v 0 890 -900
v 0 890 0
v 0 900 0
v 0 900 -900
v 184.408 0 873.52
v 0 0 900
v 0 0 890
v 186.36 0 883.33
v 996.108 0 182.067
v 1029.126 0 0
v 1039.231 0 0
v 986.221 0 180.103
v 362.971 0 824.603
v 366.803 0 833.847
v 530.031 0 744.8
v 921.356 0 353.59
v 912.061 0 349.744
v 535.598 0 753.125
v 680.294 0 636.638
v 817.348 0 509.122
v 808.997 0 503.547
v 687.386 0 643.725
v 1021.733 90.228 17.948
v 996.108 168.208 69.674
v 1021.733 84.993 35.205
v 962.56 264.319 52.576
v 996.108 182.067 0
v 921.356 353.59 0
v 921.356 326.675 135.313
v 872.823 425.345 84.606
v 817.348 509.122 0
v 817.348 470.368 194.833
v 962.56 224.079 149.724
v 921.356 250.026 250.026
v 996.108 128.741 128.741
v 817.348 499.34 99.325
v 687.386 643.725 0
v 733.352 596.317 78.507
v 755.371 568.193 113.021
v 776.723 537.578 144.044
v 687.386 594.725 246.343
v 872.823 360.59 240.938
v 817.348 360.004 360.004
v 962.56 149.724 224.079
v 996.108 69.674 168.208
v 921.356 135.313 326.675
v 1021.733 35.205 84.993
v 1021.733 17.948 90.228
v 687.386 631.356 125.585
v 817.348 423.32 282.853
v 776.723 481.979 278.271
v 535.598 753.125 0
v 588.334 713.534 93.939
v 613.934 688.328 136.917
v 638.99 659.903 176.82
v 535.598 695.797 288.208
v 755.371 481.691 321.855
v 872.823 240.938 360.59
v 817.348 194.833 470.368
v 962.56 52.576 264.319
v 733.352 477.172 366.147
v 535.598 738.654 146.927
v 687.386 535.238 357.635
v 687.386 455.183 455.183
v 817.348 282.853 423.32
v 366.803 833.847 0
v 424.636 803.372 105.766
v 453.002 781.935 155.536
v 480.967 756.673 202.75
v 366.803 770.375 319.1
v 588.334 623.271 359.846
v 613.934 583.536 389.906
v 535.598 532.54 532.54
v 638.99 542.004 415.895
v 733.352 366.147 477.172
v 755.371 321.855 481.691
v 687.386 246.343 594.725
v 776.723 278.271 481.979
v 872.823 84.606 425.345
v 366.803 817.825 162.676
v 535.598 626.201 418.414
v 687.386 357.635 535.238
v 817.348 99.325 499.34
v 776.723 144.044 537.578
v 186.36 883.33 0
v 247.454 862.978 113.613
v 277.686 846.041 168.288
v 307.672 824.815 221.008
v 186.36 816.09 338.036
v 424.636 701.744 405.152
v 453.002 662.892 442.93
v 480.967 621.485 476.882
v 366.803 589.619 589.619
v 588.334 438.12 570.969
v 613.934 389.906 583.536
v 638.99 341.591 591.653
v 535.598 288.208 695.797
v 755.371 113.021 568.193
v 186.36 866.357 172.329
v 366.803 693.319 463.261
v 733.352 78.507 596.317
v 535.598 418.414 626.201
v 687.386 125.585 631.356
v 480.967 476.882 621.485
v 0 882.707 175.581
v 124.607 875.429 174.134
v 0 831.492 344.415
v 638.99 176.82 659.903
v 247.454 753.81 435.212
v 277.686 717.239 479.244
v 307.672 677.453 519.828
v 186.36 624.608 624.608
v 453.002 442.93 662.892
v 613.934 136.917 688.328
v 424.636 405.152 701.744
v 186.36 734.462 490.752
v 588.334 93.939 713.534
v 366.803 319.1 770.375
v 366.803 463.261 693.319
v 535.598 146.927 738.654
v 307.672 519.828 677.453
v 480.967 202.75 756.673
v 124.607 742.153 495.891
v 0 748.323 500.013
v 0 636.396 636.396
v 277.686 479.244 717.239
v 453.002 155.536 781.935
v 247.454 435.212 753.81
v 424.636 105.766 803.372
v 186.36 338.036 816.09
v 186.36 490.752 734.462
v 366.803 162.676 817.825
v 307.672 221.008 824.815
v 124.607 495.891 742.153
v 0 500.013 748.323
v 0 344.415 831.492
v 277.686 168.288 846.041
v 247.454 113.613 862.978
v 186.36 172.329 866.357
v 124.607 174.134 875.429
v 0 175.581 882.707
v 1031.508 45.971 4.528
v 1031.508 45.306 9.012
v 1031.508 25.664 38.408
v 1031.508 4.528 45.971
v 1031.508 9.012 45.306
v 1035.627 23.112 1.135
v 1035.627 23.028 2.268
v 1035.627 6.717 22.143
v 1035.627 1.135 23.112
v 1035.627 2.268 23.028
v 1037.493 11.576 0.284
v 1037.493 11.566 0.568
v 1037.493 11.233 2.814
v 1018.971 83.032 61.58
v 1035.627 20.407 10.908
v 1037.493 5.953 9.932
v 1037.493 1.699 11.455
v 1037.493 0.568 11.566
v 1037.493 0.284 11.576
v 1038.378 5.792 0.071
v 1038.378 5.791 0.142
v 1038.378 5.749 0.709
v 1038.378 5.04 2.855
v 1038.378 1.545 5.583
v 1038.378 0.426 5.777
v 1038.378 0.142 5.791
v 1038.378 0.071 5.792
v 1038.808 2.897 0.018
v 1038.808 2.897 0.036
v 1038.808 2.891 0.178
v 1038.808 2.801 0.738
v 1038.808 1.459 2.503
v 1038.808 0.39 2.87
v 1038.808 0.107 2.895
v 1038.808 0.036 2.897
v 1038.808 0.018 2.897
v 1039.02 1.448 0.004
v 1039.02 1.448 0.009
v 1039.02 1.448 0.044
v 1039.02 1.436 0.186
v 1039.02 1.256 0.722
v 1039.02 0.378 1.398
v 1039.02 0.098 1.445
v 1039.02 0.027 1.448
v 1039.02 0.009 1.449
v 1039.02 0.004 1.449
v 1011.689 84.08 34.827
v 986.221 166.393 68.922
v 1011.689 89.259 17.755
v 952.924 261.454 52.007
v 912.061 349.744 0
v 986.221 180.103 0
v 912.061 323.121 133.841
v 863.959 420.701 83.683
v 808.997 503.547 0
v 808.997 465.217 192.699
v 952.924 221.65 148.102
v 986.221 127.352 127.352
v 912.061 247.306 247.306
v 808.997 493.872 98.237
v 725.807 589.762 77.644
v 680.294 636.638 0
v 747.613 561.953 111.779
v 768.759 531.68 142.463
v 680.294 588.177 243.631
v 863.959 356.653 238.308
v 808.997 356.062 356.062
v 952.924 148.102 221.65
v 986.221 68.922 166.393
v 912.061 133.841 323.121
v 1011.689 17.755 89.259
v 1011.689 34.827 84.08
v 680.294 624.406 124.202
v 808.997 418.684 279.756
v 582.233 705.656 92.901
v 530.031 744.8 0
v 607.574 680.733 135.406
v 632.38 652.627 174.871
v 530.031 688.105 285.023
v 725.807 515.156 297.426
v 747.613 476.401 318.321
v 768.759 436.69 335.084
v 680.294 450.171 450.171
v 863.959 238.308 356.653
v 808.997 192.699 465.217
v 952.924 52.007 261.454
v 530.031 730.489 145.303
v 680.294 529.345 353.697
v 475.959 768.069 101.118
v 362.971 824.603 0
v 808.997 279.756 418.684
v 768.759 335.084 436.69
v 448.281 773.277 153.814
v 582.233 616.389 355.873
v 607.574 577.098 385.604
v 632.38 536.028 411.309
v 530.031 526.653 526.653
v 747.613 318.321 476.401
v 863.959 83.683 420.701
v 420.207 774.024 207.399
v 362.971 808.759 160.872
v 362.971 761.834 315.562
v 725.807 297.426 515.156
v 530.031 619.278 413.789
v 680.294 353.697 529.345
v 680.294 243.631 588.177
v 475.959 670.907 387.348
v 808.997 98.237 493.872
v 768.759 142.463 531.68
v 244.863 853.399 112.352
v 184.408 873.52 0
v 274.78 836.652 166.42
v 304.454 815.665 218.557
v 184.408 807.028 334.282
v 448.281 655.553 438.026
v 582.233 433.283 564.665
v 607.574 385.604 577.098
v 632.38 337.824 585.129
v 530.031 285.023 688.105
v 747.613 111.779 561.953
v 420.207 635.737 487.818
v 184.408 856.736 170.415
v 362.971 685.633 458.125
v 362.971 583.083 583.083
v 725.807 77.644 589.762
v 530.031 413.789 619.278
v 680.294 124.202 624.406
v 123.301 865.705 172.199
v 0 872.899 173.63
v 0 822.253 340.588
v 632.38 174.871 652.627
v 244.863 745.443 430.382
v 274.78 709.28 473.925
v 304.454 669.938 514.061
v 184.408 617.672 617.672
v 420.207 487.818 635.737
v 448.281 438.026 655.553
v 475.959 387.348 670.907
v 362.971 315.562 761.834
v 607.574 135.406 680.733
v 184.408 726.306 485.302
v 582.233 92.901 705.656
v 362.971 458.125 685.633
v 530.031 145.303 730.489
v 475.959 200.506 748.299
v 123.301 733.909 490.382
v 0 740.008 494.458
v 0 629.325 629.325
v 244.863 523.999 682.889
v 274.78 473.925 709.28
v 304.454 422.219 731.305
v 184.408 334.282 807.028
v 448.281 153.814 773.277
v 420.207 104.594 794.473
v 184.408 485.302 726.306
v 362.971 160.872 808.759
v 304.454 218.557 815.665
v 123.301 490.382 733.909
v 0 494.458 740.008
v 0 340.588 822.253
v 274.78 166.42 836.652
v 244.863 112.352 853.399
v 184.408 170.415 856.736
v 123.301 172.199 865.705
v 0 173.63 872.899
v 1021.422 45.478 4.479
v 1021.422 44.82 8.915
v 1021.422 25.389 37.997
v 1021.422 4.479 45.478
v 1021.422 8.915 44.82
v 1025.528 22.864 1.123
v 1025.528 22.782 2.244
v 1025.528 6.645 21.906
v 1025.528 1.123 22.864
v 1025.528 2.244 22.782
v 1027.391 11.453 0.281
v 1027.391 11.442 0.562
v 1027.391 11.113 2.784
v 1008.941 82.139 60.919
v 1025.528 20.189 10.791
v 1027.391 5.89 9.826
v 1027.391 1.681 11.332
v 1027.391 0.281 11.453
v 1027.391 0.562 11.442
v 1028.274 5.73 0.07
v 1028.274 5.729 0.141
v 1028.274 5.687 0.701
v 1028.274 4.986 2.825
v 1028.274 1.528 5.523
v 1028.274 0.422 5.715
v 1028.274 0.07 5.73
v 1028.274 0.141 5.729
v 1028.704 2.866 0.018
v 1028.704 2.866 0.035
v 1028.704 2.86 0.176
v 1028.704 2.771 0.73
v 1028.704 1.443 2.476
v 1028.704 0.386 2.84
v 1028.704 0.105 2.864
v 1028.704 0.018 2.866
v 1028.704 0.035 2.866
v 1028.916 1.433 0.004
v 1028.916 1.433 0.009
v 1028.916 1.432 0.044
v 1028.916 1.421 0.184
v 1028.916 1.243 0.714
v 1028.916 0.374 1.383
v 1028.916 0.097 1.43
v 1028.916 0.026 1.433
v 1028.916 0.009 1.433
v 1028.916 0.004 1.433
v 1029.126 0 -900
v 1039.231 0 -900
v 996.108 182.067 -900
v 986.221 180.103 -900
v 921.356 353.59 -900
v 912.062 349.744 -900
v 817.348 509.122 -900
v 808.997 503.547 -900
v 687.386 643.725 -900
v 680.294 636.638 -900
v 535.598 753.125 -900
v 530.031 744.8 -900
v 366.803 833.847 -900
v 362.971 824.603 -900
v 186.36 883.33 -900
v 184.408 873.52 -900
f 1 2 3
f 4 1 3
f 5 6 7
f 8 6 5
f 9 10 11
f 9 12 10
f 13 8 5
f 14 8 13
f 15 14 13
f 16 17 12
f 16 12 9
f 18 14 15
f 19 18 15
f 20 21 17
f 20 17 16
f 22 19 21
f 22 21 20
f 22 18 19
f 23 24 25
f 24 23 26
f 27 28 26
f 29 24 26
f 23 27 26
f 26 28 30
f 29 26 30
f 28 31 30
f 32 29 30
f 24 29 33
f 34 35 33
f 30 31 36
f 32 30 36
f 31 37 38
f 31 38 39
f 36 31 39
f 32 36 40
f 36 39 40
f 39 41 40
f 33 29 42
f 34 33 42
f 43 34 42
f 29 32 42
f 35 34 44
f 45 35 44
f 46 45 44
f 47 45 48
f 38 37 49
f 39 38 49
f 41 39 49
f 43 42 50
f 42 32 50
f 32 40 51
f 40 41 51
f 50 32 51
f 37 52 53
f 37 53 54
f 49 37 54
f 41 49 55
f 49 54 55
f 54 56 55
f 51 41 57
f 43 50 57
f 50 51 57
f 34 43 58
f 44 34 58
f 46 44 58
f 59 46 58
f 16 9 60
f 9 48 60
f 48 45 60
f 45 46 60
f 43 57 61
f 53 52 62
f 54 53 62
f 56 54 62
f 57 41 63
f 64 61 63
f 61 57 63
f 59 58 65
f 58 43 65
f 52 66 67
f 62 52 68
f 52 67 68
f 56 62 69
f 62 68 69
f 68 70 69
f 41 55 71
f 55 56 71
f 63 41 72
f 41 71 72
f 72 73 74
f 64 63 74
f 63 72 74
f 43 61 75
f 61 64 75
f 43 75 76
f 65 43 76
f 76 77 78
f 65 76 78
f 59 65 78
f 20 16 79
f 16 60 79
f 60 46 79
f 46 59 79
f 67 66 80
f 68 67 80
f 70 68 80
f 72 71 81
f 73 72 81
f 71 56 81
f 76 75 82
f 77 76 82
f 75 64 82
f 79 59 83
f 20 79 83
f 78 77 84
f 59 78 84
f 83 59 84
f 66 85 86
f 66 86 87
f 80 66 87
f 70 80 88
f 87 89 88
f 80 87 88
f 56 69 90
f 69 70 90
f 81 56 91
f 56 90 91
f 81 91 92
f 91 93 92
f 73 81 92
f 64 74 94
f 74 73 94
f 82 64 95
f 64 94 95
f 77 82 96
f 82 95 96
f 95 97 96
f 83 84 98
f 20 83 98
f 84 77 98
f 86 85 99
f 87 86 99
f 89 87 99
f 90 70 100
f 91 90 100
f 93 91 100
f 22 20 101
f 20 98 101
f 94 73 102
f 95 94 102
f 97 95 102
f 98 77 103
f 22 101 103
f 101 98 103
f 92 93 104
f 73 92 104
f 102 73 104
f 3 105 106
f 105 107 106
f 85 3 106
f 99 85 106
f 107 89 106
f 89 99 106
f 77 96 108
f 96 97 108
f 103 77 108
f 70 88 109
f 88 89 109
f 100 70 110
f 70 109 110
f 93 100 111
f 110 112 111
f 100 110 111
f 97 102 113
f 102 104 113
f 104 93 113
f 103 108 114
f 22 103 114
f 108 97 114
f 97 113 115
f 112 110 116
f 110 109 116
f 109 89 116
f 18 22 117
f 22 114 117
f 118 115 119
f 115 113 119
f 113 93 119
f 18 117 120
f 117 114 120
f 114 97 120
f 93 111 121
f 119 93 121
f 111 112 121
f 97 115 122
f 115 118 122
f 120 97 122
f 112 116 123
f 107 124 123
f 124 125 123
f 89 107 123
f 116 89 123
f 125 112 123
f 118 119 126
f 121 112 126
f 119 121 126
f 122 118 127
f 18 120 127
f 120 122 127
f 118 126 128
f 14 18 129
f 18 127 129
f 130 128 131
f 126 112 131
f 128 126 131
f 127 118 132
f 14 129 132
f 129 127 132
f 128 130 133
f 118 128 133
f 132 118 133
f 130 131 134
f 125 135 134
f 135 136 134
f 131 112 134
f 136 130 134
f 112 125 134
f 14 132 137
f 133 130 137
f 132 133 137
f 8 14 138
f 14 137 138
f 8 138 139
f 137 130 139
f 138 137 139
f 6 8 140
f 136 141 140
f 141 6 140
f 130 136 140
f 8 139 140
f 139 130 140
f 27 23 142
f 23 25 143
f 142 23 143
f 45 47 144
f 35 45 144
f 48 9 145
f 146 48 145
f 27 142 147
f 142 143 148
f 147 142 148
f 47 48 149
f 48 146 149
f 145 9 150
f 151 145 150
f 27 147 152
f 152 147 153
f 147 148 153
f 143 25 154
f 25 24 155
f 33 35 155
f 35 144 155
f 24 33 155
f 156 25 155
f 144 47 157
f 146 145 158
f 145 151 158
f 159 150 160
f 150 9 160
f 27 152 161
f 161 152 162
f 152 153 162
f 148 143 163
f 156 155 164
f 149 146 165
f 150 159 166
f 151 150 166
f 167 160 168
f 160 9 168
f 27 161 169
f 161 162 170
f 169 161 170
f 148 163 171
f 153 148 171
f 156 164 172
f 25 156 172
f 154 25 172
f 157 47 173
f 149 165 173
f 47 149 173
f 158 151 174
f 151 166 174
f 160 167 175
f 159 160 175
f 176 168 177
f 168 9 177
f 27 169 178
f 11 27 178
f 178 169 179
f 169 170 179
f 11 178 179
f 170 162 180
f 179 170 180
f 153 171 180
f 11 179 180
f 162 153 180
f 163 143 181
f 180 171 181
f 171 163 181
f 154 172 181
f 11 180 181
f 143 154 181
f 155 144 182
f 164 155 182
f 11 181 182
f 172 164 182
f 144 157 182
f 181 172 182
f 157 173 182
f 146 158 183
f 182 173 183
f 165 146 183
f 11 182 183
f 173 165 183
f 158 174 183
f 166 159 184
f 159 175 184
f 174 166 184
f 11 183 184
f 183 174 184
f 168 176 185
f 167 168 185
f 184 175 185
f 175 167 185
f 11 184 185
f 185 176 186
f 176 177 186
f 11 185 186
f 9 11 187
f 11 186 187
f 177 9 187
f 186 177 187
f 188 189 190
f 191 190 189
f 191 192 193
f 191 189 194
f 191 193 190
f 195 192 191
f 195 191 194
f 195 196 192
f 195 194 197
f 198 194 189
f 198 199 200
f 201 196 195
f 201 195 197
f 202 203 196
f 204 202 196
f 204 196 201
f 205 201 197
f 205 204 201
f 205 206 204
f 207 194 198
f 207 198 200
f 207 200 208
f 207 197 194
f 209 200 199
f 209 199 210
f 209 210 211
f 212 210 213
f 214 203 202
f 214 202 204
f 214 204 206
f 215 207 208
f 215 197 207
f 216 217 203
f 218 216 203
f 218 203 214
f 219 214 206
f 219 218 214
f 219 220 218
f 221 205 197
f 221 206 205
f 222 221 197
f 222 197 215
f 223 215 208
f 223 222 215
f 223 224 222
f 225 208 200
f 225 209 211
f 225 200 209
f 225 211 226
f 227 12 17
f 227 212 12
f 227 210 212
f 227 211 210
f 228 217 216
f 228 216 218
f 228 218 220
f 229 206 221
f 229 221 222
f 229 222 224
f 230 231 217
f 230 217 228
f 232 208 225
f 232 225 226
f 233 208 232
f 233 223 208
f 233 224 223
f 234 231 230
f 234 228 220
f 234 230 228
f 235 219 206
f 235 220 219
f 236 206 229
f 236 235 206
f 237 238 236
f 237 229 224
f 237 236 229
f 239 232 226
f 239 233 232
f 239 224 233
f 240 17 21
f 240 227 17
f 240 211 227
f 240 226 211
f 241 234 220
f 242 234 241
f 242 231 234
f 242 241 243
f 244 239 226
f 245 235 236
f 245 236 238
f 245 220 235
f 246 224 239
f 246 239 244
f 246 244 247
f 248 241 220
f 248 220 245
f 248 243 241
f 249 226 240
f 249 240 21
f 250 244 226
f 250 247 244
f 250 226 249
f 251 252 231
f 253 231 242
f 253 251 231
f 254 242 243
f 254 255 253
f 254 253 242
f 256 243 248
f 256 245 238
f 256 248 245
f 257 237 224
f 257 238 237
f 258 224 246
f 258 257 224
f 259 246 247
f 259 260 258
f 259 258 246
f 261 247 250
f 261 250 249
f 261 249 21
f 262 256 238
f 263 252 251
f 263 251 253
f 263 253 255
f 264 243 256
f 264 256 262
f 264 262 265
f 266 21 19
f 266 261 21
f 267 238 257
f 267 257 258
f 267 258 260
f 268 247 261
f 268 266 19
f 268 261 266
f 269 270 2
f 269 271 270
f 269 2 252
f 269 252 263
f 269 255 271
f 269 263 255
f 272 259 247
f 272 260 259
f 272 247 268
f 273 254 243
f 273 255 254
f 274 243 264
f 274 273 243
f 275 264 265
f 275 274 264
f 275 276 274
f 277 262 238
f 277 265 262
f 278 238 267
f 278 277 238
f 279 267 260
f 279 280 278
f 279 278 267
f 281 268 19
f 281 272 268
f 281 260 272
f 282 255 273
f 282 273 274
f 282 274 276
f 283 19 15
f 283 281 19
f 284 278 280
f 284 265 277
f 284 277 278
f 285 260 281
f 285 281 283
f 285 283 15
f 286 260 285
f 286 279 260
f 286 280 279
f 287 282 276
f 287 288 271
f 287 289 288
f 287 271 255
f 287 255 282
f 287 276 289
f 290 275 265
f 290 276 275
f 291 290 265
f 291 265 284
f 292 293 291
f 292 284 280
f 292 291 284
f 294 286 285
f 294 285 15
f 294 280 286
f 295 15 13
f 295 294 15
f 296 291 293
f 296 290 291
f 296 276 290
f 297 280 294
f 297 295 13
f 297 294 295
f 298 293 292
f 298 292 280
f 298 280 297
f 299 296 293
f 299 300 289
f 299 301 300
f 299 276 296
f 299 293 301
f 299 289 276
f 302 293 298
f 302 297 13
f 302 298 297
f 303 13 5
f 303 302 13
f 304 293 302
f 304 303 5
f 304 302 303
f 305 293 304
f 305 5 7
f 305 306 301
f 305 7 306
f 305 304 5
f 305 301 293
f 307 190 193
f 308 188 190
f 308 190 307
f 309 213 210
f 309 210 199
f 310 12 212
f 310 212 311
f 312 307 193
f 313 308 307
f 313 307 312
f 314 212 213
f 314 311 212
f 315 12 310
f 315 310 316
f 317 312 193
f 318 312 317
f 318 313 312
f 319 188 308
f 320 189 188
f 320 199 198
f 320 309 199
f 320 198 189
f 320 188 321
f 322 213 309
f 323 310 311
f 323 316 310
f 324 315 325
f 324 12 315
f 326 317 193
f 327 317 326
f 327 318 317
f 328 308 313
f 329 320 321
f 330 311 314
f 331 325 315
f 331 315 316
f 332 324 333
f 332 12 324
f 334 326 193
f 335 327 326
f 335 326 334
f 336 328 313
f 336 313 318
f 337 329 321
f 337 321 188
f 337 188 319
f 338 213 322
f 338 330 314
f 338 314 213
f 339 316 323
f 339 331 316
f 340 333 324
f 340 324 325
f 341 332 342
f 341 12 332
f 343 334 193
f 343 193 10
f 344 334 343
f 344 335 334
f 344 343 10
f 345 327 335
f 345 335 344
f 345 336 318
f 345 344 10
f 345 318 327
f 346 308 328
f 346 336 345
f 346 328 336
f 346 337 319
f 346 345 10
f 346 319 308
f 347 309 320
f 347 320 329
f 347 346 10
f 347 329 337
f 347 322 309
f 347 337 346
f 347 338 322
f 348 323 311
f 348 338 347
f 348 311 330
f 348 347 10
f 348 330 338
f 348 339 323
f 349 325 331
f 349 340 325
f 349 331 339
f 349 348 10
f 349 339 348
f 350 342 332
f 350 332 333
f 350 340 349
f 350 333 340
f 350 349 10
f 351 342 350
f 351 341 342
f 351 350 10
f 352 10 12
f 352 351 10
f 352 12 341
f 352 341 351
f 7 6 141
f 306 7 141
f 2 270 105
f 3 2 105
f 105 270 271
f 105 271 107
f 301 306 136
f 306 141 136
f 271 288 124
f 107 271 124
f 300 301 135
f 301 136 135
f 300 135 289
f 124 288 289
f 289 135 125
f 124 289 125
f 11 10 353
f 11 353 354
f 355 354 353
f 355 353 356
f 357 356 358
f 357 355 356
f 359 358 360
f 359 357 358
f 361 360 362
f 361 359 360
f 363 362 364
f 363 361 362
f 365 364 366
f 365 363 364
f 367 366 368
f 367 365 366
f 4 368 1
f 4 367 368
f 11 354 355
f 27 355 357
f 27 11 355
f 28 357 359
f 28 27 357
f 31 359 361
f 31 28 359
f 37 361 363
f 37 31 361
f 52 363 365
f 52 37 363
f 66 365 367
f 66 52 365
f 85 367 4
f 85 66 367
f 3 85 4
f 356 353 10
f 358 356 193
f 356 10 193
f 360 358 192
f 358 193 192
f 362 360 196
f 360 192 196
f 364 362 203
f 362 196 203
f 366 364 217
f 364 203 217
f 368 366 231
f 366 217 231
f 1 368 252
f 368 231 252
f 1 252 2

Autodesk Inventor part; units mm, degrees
ref_plane "XZ Plane" through (0, 0, 0) normal (0, 1, 0) x (-1, 0, 0)
sketch "Sketch1" plane through (0, 0, 0) normal (0, 0, 1) x (1, 0, 0)
  arc A0 (0, 900) -> (-1039.2305, 0) centre (0, -150) ccw
  arc A1 (1039.2305, 0) -> (0, 900) centre (0, -150) ccw
  arc A2 (0, 890) -> (-1029.1258, 0) centre (0, -150) ccw
  arc A3 (1029.1258, 0) -> (0, 890) centre (0, -150) ccw
  line L0 (1029.1258, 0) -> (1039.2305, 0)
  line L1 (-1039.2305, 0) -> (-1029.1258, 0)
  point P0 (0, 0)
  dimension "d0" = 0
  dimension "d1" = 0
  dimension "d2" = 0
  dimension "d3" = 150
  dimension "d6" = 900
  dimension "d8" = 1039.2305
  dimension "d10" = 0
  dimension "d11" = 10
  dimension "d12" = 0
revolve "Revolution2" add sketch "Sketch1" angle 90 about axis through (1029.1258, 0, 0) along (1, 0, 0)
ref_plane "end1" through (-1039.2305, 0, 0) normal (1, 0, 0) x (0, 1, 0)
sketch "Sketch3" plane through (-1039.2305, 0, 0) normal (1, 0, 0) x (0, 1, 0)
  line L0 (900, 0) -> (0, 0) projected
  line L1 (0, 900) -> (0, 0) projected
  line L2 (900, 0) -> (0, 0)
  line L3 (0, 0) -> (0, 900)
  line L4 (0, 900) -> (900, 900)
  line L5 (900, 900) -> (900, 0)
extrude "Extrusion1" cut sketch "Sketch3" along normal blind 1039.2305
ref_plane "end2" through (1039.2305, 0, 0) normal (1, 0, 0) x (0, 1, 0)
sketch "Sketch4" plane through (0, -150, 0) normal (0, 0, -1) x (-0.7559289, 0.6546537, 0)
  arc A0 (687.3864, 793.7254) -> (-687.3864, 793.7254) centre (0, 0) ccw projected
  arc A1 (680.8398, 786.1661) -> (-679.748, 787.1104) centre (0, 0) ccw projected
  line L0 (680.8398, 786.1661) -> (687.3864, 793.7254) projected
  line L1 (-679.748, 787.1104) -> (-687.3864, 793.7254) projected
  point P0 (98.1981, 113.3893)
extrude "Extrusion2" add sketch "Sketch4" along normal blind 900
equation "\"d14\" = d8"
properties part number "cover2_sule_extended"
